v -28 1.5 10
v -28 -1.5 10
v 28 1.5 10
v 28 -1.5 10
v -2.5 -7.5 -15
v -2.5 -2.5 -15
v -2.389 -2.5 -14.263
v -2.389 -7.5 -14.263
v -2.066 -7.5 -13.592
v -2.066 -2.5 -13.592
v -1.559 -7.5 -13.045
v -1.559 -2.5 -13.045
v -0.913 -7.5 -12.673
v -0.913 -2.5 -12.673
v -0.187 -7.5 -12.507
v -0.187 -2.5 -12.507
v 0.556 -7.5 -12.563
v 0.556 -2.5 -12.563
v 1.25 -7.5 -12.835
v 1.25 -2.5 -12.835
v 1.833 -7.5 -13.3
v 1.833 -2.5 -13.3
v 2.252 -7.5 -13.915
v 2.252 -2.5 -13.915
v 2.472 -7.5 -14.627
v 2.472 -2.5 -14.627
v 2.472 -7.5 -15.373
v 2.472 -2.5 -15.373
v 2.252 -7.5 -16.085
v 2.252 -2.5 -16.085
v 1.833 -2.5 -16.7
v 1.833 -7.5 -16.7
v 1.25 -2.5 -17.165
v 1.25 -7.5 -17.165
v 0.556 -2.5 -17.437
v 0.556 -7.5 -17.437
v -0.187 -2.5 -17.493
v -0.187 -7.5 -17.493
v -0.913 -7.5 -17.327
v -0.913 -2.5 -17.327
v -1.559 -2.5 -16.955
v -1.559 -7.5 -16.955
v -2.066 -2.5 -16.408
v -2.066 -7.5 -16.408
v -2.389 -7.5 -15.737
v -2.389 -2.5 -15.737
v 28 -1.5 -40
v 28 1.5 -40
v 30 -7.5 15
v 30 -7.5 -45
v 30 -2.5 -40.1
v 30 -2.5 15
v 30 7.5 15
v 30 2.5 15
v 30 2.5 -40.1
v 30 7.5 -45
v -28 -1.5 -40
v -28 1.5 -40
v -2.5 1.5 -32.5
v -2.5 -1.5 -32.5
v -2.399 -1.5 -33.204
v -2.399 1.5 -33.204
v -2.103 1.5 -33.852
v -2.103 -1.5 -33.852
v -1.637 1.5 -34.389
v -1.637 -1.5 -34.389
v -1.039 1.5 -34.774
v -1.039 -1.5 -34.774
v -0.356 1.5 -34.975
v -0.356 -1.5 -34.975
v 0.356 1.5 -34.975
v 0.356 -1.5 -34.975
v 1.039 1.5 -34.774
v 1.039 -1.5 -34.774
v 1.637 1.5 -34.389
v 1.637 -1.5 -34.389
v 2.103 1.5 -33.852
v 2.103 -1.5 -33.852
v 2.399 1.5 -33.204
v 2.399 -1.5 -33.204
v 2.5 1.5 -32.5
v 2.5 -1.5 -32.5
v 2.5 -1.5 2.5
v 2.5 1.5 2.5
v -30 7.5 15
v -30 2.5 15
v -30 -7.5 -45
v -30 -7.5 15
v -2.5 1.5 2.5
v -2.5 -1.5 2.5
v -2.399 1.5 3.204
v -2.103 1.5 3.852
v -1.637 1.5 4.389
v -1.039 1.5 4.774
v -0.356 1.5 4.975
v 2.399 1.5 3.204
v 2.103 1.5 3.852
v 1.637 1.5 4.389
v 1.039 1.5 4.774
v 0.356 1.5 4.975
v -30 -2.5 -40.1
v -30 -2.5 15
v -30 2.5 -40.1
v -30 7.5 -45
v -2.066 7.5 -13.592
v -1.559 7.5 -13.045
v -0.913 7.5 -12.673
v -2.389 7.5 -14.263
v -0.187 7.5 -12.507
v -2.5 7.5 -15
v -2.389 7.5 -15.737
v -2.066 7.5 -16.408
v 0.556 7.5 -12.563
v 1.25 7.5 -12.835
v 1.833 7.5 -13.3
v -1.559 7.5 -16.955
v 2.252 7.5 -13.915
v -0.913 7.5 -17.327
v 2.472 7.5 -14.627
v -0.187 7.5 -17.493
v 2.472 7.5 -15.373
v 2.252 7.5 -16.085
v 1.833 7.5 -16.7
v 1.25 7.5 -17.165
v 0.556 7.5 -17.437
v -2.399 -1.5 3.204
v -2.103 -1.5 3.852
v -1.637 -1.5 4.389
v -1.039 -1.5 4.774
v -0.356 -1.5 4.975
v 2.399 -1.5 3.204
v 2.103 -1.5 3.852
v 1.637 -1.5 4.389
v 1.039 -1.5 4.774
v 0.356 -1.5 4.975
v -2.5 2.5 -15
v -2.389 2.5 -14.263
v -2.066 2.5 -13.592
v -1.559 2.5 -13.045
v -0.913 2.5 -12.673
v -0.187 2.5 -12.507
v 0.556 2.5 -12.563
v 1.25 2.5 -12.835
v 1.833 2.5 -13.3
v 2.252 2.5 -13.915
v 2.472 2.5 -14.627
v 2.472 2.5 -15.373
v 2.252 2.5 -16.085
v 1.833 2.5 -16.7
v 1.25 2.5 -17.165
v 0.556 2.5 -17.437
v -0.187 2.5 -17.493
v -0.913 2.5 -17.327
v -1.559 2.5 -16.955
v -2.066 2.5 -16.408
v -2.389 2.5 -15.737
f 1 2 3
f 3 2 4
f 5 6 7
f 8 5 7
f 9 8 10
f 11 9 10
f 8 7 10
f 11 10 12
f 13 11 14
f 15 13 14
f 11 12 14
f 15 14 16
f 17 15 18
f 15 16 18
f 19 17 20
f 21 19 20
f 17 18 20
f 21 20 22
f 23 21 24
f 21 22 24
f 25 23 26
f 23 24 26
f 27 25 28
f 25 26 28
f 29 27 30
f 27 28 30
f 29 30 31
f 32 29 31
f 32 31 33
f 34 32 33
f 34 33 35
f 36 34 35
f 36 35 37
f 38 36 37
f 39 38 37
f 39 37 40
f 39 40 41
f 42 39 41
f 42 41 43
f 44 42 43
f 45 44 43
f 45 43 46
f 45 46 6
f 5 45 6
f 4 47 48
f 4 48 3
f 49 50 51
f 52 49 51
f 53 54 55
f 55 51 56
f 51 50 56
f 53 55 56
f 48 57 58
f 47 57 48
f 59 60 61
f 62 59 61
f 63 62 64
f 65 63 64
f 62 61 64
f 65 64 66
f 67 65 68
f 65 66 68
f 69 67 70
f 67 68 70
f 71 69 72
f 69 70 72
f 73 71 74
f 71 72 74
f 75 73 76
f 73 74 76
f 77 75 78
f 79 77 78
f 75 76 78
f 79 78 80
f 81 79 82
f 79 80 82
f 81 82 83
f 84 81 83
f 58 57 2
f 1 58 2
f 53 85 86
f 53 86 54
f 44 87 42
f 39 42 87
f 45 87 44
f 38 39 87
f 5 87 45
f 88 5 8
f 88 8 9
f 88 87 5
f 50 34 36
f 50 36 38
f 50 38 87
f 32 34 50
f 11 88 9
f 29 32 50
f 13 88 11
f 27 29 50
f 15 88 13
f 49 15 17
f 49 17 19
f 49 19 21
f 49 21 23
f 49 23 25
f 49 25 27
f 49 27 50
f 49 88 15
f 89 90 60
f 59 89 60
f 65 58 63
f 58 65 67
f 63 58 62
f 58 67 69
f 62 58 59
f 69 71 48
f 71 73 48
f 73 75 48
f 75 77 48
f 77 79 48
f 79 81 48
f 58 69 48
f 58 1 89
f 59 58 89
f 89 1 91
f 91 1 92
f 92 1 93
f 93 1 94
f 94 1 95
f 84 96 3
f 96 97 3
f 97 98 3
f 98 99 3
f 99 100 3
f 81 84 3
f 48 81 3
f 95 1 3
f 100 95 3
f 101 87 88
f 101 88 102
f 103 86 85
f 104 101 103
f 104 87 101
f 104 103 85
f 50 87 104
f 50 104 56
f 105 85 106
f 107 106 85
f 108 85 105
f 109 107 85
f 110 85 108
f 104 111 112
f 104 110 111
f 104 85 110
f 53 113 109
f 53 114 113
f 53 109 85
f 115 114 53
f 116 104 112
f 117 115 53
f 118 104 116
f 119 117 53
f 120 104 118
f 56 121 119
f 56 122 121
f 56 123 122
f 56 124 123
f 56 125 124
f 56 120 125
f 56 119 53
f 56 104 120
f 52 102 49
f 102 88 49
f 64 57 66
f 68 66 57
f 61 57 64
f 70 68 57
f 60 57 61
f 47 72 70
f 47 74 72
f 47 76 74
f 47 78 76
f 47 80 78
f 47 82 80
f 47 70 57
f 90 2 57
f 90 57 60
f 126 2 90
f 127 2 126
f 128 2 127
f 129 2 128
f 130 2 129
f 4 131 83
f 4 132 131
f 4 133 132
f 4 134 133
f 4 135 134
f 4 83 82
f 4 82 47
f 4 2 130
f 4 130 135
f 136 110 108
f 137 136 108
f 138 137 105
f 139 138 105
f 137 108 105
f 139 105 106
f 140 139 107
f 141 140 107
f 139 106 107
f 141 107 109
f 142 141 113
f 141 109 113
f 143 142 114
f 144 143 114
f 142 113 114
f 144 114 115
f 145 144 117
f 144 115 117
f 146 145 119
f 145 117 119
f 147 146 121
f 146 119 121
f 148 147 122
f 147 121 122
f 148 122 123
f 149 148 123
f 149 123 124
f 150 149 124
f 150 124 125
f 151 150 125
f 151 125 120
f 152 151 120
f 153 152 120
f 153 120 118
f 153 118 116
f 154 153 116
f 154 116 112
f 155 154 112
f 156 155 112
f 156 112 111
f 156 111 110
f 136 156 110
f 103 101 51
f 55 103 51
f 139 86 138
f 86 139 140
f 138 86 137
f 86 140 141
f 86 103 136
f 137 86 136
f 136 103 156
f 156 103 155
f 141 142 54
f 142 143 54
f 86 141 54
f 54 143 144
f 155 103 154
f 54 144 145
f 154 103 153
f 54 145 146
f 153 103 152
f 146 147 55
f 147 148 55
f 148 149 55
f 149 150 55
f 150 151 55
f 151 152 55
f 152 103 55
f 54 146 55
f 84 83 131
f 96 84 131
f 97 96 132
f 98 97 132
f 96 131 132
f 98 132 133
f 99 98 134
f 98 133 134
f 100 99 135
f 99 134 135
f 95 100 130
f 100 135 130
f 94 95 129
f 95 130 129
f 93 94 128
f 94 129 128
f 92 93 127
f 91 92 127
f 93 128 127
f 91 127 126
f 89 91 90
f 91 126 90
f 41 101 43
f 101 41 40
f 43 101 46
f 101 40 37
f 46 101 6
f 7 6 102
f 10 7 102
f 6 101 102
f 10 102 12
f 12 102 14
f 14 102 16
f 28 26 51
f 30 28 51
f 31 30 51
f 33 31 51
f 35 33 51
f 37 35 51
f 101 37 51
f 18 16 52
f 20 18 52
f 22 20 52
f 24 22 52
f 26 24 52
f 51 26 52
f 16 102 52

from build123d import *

# Parameters (mm, degrees)
F0_W      = 56
F0_H      = 50
F1_DEPTH  = 1.5
F3_DEPTH  = 25
F5_W      = 60
F5_H      = 60
F6_DEPTH  = 2.5
F7_W      = 60
F7_H      = 15
F8_DEPTH  = 4.9
F9_W      = 60
F9_H      = 5
F10_DEPTH = 55.1
F11_R     = 2.5
F12_DEPTH = 25


with BuildPart() as f1:
    # F0 (on Front) → F1 (new body, symmetric)
    with BuildSketch(Plane.XZ):
        with Locations((0, -15)):
            Rectangle(F0_W, F0_H)
    extrude(amount=F1_DEPTH, both=True)

    # F2 (on face) → F3 (cut)
    with BuildSketch(Plane.XZ.offset(1.5)):
        with BuildLine():
            Line((-2.5, 2.5), (2.5, 2.5))
            ThreePointArc((2.5, 2.5), (0, 5), (-2.5, 2.5))
        make_face()
        with BuildLine():
            Line((2.5, -32.5), (2.5, 2.5))
            ThreePointArc((2.5, 2.5), (0, 0), (-2.5, 2.5))
            Line((-2.5, 2.5), (-2.5, -32.5))
            ThreePointArc((-2.5, -32.5), (0, -30), (2.5, -32.5))
        make_face()
        with BuildLine():
            ThreePointArc((-2.5, 2.5), (0, 0), (2.5, 2.5))
            Line((2.5, 2.5), (-2.5, 2.5))
        make_face()
        with BuildLine():
            Line((-2.5, -32.5), (2.5, -32.5))
            ThreePointArc((2.5, -32.5), (0, -30), (-2.5, -32.5))
        make_face()
        with BuildLine():
            ThreePointArc((-2.5, -32.5), (0, -35), (2.5, -32.5))
            Line((2.5, -32.5), (-2.5, -32.5))
        make_face()
    extrude(amount=-F3_DEPTH, mode=Mode.SUBTRACT)


with BuildPart() as f6:
    # F5 (on offset) → F6 (new body, symmetric)
    with BuildSketch(Plane.XZ.offset(5)):
        with Locations((0, -15)):
            Rectangle(F5_W, F5_H)
    extrude(amount=F6_DEPTH, both=True)

    # F7 (on face) → F8 (join)
    with BuildSketch(Plane(origin=(0, 0, -45), x_dir=(1, 0, 0), z_dir=(0, 0, -1))):
        Rectangle(F7_W, F7_H)
    extrude(amount=-F8_DEPTH)

    # F9 (on face) → F10 (join)
    with BuildSketch(Plane.XY.offset(-40.1)):
        with Locations((0, 5)):
            Rectangle(F9_W, F9_H)
    extrude(amount=F10_DEPTH)

    # F11 (on face) → F12 (cut)
    with BuildSketch(Plane(origin=(0, 7.5, 0), x_dir=(-1, 0, 0), z_dir=(0, 1, 0))):
        with Locations((0, -15)):
            Circle(F11_R)
    extrude(amount=-F12_DEPTH, mode=Mode.SUBTRACT)


solid = Compound([f1.part, f6.part])
